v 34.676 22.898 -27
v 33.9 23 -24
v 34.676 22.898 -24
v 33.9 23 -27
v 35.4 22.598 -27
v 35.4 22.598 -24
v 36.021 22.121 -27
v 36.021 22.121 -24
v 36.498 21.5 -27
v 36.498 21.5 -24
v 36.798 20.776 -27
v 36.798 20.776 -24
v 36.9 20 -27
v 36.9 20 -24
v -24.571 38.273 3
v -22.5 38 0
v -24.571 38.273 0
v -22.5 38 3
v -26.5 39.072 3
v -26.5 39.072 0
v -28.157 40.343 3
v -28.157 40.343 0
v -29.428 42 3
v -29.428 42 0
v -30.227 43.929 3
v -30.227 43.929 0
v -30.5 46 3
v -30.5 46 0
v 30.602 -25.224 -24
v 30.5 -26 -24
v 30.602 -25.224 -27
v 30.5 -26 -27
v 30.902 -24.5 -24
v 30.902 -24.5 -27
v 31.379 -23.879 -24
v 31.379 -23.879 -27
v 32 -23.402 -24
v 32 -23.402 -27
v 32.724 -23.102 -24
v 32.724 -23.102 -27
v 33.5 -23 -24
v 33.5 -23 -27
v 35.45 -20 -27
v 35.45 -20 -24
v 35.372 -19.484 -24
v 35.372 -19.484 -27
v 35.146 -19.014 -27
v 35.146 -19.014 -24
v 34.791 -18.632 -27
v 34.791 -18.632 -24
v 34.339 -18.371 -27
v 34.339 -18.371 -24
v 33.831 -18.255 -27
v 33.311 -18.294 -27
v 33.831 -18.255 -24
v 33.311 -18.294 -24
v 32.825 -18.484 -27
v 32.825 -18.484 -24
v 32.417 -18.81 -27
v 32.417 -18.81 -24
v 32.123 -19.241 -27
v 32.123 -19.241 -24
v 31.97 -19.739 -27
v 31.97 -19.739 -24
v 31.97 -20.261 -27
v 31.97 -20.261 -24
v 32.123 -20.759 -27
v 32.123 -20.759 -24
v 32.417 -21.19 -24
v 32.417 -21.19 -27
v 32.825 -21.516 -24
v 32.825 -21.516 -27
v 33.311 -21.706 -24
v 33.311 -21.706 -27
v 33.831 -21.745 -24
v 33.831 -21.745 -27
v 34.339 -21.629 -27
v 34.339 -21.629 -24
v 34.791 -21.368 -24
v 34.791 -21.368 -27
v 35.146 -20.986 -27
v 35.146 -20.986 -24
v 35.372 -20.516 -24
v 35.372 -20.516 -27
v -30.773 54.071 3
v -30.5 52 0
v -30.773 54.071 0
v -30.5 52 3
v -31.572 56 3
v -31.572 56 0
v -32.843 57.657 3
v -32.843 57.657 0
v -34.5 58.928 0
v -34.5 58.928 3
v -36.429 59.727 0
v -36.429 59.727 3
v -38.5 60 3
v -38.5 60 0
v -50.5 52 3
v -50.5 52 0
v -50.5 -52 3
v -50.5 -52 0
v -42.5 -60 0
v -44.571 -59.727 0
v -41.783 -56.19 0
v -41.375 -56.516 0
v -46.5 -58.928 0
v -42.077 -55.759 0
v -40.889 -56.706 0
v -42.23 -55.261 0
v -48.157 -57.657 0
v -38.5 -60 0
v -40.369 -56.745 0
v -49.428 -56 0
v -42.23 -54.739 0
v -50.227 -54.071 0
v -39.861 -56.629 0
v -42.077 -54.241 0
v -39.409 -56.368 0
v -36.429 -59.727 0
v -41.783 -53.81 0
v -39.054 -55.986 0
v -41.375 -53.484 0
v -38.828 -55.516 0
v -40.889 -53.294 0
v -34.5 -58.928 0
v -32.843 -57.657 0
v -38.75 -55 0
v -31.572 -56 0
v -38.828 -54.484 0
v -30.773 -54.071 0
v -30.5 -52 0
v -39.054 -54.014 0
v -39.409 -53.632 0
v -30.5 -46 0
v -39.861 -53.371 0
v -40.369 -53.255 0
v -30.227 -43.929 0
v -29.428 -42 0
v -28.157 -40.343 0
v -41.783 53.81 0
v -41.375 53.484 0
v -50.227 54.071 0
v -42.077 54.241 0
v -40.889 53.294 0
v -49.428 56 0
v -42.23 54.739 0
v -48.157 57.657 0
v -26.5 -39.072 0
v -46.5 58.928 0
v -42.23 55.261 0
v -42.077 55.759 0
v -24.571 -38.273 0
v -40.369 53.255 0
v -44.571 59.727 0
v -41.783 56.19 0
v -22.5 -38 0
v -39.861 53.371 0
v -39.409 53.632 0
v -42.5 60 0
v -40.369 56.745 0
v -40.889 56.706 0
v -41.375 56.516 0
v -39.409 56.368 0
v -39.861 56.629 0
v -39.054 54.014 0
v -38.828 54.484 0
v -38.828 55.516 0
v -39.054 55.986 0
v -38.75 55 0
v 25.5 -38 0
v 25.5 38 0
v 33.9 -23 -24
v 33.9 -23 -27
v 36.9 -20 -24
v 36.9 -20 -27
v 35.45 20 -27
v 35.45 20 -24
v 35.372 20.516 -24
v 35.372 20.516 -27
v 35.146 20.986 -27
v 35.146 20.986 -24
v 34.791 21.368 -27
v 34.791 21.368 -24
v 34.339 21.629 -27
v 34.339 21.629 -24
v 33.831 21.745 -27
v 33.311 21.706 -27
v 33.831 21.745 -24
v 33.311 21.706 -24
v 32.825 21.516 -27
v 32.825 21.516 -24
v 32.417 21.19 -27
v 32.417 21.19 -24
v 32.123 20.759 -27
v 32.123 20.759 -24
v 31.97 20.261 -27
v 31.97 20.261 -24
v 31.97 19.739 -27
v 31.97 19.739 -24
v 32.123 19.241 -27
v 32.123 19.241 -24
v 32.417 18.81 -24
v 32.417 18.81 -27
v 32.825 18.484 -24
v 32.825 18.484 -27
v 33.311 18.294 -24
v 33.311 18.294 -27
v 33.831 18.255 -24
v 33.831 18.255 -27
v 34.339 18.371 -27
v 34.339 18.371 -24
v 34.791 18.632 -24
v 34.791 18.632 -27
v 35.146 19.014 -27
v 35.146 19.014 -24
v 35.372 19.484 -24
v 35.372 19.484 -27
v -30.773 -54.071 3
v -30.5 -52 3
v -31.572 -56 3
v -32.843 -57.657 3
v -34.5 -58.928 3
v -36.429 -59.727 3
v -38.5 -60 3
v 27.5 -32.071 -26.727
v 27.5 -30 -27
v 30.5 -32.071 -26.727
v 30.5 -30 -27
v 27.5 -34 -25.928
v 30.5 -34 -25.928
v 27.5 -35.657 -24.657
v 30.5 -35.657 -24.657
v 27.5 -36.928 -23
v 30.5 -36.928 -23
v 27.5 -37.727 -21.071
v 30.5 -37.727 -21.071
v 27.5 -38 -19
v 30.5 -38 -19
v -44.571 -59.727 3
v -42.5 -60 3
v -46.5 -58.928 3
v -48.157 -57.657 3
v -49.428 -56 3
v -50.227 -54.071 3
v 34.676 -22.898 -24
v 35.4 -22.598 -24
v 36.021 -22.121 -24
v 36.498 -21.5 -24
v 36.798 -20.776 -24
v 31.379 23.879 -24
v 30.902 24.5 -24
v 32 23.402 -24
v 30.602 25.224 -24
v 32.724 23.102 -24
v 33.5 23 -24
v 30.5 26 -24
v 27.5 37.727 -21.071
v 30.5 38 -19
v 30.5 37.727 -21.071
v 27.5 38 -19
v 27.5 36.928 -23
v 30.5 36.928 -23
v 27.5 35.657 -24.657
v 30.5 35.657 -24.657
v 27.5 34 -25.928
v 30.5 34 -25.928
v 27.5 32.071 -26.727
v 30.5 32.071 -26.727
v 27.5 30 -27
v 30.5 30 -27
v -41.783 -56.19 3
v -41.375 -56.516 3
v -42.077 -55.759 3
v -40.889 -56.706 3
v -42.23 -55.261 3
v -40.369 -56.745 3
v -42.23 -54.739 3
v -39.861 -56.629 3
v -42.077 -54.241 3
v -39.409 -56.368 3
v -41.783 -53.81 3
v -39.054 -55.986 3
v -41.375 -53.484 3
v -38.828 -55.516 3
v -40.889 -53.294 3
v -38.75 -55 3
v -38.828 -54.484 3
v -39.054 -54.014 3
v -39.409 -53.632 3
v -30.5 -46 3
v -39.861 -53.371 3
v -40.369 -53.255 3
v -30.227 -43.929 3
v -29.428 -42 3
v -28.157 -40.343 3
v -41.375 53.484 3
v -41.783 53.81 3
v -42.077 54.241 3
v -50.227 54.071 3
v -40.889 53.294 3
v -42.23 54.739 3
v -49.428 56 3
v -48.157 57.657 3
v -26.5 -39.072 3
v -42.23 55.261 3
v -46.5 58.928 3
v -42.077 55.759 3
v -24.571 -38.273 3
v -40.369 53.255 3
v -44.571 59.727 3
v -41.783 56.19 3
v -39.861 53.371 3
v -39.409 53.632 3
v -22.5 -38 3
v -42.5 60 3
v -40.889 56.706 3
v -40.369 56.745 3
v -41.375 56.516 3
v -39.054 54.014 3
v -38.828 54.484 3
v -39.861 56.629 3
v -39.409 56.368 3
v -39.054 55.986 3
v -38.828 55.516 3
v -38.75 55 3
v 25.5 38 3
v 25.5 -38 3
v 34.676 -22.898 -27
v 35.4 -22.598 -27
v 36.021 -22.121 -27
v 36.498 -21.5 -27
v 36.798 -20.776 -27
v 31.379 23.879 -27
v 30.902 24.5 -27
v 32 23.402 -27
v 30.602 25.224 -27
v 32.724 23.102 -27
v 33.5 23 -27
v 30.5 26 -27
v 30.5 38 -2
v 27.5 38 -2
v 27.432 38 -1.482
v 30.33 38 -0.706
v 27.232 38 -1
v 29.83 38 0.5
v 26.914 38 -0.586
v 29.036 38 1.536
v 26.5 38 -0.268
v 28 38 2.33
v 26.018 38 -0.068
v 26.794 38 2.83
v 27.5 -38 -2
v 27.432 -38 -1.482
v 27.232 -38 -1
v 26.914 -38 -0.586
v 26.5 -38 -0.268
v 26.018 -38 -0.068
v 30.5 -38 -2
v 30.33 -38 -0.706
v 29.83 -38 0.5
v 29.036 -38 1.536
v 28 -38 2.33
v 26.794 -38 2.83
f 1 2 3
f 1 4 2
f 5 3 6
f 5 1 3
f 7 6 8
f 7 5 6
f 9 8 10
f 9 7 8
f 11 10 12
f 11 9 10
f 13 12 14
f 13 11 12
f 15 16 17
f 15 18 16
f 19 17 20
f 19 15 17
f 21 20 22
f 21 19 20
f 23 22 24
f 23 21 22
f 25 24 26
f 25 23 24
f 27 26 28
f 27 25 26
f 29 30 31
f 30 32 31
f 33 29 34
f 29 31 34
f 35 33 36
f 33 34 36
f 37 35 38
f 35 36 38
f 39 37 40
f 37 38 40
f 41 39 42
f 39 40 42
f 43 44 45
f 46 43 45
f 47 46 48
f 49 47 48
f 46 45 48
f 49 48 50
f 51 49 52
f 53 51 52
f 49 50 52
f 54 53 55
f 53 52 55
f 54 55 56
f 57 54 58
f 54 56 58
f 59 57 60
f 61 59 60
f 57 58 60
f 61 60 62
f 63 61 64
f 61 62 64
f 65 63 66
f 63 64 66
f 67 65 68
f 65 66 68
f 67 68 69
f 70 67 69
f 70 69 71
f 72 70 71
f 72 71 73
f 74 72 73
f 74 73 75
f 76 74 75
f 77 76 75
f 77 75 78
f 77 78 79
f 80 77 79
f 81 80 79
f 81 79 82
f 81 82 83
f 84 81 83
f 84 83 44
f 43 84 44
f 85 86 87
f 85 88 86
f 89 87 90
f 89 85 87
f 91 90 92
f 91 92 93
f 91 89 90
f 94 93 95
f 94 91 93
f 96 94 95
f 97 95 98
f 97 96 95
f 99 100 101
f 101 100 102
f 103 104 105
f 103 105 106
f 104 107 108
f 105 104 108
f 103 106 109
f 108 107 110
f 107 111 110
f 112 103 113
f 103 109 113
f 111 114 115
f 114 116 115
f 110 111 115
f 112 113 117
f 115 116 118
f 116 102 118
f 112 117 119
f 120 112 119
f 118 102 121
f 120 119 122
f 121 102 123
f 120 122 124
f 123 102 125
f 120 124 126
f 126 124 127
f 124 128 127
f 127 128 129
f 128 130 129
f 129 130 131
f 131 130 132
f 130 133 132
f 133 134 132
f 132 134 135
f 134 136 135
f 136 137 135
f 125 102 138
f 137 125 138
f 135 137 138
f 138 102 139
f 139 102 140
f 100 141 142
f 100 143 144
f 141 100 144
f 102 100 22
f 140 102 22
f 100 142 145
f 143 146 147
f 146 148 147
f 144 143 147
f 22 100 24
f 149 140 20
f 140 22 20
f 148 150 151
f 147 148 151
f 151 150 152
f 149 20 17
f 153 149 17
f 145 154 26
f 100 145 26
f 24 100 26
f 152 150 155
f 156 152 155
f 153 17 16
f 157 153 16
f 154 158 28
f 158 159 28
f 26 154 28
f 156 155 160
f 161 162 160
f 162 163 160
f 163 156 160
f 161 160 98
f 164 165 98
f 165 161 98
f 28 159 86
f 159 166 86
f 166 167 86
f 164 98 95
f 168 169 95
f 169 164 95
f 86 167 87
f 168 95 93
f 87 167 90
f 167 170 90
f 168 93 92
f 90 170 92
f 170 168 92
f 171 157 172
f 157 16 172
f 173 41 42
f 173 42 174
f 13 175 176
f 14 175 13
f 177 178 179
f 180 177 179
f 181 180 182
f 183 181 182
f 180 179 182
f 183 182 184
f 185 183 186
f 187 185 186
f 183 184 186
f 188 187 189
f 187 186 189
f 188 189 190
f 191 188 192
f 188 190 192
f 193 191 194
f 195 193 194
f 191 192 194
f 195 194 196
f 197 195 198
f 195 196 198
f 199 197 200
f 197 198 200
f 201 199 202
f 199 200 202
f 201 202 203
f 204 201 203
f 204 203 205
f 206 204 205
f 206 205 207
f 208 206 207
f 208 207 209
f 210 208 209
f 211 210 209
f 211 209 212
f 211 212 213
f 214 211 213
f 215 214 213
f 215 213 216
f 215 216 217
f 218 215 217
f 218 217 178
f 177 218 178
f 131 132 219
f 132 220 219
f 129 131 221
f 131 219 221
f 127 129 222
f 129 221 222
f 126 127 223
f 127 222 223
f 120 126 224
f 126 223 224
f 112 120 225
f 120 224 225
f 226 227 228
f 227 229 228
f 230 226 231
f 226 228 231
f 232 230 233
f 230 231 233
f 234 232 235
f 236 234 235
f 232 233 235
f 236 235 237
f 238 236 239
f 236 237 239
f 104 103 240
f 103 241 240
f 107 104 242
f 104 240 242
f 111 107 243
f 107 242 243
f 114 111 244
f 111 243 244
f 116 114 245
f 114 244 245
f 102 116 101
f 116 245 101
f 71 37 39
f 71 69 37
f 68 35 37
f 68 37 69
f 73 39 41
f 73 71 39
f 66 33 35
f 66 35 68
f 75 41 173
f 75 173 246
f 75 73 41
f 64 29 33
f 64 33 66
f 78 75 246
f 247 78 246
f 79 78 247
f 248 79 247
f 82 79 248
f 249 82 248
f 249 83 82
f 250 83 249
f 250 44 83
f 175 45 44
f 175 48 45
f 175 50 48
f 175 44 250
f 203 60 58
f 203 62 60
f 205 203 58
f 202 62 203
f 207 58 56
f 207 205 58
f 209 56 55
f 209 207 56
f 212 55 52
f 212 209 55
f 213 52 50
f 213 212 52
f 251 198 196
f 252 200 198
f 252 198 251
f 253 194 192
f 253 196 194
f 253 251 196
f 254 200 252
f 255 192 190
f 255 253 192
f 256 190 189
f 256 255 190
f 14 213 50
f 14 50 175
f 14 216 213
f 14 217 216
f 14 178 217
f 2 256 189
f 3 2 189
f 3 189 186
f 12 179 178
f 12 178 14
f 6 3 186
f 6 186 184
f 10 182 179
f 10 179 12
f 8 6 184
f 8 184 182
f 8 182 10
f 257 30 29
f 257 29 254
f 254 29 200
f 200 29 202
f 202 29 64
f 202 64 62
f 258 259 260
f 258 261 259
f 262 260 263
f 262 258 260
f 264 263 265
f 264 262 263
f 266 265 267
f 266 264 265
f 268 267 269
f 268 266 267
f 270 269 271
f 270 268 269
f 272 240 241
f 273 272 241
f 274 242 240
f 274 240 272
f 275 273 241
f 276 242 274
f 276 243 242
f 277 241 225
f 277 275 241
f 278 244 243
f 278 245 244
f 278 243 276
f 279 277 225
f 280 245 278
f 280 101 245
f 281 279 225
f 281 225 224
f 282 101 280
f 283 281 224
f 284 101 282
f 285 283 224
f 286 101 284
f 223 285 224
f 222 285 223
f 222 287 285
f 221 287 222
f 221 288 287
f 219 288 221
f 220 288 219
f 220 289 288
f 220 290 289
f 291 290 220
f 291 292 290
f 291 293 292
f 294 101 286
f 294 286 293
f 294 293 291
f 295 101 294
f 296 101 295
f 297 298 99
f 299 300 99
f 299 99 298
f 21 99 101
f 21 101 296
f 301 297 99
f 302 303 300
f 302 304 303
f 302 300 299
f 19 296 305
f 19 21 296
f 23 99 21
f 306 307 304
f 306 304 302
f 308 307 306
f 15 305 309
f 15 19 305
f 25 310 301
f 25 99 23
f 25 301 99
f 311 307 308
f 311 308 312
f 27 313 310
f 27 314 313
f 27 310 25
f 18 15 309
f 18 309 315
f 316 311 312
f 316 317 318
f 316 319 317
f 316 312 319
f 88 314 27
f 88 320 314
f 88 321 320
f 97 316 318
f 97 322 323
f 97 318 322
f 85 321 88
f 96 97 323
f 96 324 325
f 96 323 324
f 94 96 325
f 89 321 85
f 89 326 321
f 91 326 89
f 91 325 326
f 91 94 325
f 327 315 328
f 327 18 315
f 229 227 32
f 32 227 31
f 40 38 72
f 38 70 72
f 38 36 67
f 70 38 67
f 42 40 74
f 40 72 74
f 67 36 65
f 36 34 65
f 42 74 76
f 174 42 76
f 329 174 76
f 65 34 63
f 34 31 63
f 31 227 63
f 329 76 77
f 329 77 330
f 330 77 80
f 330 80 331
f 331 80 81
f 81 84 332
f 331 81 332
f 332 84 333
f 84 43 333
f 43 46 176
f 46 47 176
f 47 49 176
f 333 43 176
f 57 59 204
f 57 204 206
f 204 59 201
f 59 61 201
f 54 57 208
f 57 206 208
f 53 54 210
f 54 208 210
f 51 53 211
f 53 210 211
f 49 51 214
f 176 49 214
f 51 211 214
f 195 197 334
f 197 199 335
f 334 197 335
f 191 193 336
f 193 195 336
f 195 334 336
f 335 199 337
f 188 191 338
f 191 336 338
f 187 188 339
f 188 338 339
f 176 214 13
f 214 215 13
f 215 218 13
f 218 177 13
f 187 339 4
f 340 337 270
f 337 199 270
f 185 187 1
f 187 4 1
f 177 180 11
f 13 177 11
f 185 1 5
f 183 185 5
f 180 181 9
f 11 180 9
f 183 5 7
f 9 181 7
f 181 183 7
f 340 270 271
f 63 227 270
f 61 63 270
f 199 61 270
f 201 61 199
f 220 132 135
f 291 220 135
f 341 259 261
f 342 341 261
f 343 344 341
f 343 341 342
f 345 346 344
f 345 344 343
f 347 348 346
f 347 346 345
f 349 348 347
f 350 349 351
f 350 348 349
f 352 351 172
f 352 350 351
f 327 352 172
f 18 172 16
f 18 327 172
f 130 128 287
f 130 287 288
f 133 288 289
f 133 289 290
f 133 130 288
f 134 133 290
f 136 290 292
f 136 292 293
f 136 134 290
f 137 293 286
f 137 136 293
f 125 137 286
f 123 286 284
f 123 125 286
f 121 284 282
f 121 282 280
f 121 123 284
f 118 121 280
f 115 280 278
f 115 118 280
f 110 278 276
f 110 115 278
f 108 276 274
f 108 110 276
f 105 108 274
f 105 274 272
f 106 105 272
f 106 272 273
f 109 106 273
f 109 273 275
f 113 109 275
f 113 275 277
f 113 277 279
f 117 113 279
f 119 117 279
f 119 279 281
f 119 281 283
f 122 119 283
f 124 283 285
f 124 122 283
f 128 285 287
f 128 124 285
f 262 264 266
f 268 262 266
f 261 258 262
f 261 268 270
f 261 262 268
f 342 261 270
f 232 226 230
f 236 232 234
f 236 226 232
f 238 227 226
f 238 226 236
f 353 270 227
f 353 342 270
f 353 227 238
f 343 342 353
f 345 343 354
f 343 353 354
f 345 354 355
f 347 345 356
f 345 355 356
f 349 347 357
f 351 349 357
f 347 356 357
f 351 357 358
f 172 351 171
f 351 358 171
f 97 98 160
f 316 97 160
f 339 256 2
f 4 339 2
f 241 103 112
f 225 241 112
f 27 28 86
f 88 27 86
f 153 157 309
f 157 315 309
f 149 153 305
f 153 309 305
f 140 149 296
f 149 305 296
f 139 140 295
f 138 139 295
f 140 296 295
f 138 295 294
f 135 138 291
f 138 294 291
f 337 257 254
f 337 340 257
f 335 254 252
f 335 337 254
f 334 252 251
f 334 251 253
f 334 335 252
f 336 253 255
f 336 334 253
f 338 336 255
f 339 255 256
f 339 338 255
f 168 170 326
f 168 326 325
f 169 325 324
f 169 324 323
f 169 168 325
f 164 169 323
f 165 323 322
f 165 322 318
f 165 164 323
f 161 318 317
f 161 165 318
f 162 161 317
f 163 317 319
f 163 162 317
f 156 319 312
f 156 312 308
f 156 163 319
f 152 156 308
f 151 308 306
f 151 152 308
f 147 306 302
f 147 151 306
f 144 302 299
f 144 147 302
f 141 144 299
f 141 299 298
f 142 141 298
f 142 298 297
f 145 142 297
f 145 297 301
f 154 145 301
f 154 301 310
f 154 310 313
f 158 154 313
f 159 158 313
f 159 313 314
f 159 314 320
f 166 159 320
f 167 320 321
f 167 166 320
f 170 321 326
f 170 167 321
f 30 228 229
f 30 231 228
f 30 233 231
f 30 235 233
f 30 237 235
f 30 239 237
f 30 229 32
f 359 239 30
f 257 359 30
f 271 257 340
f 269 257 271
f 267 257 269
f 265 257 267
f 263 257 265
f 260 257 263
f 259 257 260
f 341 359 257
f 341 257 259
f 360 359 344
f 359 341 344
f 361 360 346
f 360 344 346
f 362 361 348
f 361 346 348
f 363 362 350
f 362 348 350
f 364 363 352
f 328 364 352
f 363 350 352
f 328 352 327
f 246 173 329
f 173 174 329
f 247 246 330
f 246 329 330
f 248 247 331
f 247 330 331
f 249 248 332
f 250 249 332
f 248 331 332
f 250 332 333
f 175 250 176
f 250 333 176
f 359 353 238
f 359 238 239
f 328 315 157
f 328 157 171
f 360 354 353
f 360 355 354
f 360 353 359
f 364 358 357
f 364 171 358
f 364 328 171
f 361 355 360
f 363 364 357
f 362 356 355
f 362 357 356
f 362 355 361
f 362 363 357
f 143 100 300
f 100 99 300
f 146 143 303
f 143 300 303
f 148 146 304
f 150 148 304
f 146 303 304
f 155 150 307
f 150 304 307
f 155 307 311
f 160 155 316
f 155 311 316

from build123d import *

# Parameters (mm, degrees)
ESQUISSE1_R             = 1.75
BOSS_EXTRU_1_DEPTH      = 3
ESQUISSE1_3_R           = 1.75
BOSS_EXTRU_2_DEPTH      = 27
ESQUISSE1_4_W           = 6.4
ESQUISSE1_4_H           = 46
ESQUISSE1_4_R           = 1.75
ENL_V_MAT_EXTRU_1_DEPTH = 24
CONG_1_R                = 8
CONG_2_R                = 3
CONG_3_R                = 2
CONG_4_R                = 5


with BuildPart() as part:
    # Esquisse1 → Boss.-Extru.1 (new body)
    with BuildSketch(Plane.XY):
        Polygon((30.5, 38), (-30.5, 38), (-30.5, 60), (-50.5, 60), (-50.5, -60), (-30.5, -60), (-30.5, -38), (30.5, -38), align=None)
        with Locations((-40.5, 55)):
            Circle(ESQUISSE1_R, mode=Mode.SUBTRACT)
        with Locations((-40.5, -55)):
            Circle(ESQUISSE1_R, mode=Mode.SUBTRACT)
    extrude(amount=BOSS_EXTRU_1_DEPTH)

    # Esquisse1_3 → Boss.-Extru.2 (add)
    with BuildSketch(Plane.XY):
        Polygon((36.9, -23), (36.9, 23), (30.5, 23), (30.5, 38), (27.5, 38), (27.5, -38), (30.5, -38), (30.5, -23), align=None)
        with Locations((33.7, -20)):
            Circle(ESQUISSE1_3_R, mode=Mode.SUBTRACT)
        with Locations((33.7, 20)):
            Circle(ESQUISSE1_3_R, mode=Mode.SUBTRACT)
    extrude(amount=-BOSS_EXTRU_2_DEPTH)

    # Esquisse1_4 → Enl_v. mat.-Extru.1 (cut)
    with BuildSketch(Plane.XY):
        with Locations((33.7, 0)):
            Rectangle(ESQUISSE1_4_W, ESQUISSE1_4_H)
        with Locations((33.7, -20)):
            Circle(ESQUISSE1_4_R, mode=Mode.SUBTRACT)
        with Locations((33.7, 20)):
            Circle(ESQUISSE1_4_R, mode=Mode.SUBTRACT)
    extrude(amount=-ENL_V_MAT_EXTRU_1_DEPTH, mode=Mode.SUBTRACT)

    # Cong_1
    cong_1_edges = [part.edges().sort_by_distance(p)[0] for p in [
        (-30.5, 38, 1.5),
        (-30.5, 60, 1.5),
        (-50.5, 60, 1.5),
        (-30.5, -38, 1.5),
        (-50.5, -60, 1.5),
        (-30.5, -60, 1.5),
        (29, 38, -27),
        (29, -38, -27),
    ]]
    fillet(cong_1_edges, radius=CONG_1_R)

    # Cong_2
    cong_2_edges = [part.edges().sort_by_distance(p)[0] for p in [
        (30.5, 23, -25.5),
        (36.9, 23, -25.5),
        (36.9, -23, -25.5),
        (30.5, -23, -25.5),
    ]]
    fillet(cong_2_edges, radius=CONG_2_R)

    # Cong_3
    cong_3_edges = [part.edges().sort_by_distance(p)[0] for p in [
        (27.5, 0, 0),
    ]]
    fillet(cong_3_edges, radius=CONG_3_R)

    # Cong_4
    cong_4_edges = [part.edges().sort_by_distance(p)[0] for p in [
        (30.5, 0, 3),
    ]]
    fillet(cong_4_edges, radius=CONG_4_R)


solid = part.part
